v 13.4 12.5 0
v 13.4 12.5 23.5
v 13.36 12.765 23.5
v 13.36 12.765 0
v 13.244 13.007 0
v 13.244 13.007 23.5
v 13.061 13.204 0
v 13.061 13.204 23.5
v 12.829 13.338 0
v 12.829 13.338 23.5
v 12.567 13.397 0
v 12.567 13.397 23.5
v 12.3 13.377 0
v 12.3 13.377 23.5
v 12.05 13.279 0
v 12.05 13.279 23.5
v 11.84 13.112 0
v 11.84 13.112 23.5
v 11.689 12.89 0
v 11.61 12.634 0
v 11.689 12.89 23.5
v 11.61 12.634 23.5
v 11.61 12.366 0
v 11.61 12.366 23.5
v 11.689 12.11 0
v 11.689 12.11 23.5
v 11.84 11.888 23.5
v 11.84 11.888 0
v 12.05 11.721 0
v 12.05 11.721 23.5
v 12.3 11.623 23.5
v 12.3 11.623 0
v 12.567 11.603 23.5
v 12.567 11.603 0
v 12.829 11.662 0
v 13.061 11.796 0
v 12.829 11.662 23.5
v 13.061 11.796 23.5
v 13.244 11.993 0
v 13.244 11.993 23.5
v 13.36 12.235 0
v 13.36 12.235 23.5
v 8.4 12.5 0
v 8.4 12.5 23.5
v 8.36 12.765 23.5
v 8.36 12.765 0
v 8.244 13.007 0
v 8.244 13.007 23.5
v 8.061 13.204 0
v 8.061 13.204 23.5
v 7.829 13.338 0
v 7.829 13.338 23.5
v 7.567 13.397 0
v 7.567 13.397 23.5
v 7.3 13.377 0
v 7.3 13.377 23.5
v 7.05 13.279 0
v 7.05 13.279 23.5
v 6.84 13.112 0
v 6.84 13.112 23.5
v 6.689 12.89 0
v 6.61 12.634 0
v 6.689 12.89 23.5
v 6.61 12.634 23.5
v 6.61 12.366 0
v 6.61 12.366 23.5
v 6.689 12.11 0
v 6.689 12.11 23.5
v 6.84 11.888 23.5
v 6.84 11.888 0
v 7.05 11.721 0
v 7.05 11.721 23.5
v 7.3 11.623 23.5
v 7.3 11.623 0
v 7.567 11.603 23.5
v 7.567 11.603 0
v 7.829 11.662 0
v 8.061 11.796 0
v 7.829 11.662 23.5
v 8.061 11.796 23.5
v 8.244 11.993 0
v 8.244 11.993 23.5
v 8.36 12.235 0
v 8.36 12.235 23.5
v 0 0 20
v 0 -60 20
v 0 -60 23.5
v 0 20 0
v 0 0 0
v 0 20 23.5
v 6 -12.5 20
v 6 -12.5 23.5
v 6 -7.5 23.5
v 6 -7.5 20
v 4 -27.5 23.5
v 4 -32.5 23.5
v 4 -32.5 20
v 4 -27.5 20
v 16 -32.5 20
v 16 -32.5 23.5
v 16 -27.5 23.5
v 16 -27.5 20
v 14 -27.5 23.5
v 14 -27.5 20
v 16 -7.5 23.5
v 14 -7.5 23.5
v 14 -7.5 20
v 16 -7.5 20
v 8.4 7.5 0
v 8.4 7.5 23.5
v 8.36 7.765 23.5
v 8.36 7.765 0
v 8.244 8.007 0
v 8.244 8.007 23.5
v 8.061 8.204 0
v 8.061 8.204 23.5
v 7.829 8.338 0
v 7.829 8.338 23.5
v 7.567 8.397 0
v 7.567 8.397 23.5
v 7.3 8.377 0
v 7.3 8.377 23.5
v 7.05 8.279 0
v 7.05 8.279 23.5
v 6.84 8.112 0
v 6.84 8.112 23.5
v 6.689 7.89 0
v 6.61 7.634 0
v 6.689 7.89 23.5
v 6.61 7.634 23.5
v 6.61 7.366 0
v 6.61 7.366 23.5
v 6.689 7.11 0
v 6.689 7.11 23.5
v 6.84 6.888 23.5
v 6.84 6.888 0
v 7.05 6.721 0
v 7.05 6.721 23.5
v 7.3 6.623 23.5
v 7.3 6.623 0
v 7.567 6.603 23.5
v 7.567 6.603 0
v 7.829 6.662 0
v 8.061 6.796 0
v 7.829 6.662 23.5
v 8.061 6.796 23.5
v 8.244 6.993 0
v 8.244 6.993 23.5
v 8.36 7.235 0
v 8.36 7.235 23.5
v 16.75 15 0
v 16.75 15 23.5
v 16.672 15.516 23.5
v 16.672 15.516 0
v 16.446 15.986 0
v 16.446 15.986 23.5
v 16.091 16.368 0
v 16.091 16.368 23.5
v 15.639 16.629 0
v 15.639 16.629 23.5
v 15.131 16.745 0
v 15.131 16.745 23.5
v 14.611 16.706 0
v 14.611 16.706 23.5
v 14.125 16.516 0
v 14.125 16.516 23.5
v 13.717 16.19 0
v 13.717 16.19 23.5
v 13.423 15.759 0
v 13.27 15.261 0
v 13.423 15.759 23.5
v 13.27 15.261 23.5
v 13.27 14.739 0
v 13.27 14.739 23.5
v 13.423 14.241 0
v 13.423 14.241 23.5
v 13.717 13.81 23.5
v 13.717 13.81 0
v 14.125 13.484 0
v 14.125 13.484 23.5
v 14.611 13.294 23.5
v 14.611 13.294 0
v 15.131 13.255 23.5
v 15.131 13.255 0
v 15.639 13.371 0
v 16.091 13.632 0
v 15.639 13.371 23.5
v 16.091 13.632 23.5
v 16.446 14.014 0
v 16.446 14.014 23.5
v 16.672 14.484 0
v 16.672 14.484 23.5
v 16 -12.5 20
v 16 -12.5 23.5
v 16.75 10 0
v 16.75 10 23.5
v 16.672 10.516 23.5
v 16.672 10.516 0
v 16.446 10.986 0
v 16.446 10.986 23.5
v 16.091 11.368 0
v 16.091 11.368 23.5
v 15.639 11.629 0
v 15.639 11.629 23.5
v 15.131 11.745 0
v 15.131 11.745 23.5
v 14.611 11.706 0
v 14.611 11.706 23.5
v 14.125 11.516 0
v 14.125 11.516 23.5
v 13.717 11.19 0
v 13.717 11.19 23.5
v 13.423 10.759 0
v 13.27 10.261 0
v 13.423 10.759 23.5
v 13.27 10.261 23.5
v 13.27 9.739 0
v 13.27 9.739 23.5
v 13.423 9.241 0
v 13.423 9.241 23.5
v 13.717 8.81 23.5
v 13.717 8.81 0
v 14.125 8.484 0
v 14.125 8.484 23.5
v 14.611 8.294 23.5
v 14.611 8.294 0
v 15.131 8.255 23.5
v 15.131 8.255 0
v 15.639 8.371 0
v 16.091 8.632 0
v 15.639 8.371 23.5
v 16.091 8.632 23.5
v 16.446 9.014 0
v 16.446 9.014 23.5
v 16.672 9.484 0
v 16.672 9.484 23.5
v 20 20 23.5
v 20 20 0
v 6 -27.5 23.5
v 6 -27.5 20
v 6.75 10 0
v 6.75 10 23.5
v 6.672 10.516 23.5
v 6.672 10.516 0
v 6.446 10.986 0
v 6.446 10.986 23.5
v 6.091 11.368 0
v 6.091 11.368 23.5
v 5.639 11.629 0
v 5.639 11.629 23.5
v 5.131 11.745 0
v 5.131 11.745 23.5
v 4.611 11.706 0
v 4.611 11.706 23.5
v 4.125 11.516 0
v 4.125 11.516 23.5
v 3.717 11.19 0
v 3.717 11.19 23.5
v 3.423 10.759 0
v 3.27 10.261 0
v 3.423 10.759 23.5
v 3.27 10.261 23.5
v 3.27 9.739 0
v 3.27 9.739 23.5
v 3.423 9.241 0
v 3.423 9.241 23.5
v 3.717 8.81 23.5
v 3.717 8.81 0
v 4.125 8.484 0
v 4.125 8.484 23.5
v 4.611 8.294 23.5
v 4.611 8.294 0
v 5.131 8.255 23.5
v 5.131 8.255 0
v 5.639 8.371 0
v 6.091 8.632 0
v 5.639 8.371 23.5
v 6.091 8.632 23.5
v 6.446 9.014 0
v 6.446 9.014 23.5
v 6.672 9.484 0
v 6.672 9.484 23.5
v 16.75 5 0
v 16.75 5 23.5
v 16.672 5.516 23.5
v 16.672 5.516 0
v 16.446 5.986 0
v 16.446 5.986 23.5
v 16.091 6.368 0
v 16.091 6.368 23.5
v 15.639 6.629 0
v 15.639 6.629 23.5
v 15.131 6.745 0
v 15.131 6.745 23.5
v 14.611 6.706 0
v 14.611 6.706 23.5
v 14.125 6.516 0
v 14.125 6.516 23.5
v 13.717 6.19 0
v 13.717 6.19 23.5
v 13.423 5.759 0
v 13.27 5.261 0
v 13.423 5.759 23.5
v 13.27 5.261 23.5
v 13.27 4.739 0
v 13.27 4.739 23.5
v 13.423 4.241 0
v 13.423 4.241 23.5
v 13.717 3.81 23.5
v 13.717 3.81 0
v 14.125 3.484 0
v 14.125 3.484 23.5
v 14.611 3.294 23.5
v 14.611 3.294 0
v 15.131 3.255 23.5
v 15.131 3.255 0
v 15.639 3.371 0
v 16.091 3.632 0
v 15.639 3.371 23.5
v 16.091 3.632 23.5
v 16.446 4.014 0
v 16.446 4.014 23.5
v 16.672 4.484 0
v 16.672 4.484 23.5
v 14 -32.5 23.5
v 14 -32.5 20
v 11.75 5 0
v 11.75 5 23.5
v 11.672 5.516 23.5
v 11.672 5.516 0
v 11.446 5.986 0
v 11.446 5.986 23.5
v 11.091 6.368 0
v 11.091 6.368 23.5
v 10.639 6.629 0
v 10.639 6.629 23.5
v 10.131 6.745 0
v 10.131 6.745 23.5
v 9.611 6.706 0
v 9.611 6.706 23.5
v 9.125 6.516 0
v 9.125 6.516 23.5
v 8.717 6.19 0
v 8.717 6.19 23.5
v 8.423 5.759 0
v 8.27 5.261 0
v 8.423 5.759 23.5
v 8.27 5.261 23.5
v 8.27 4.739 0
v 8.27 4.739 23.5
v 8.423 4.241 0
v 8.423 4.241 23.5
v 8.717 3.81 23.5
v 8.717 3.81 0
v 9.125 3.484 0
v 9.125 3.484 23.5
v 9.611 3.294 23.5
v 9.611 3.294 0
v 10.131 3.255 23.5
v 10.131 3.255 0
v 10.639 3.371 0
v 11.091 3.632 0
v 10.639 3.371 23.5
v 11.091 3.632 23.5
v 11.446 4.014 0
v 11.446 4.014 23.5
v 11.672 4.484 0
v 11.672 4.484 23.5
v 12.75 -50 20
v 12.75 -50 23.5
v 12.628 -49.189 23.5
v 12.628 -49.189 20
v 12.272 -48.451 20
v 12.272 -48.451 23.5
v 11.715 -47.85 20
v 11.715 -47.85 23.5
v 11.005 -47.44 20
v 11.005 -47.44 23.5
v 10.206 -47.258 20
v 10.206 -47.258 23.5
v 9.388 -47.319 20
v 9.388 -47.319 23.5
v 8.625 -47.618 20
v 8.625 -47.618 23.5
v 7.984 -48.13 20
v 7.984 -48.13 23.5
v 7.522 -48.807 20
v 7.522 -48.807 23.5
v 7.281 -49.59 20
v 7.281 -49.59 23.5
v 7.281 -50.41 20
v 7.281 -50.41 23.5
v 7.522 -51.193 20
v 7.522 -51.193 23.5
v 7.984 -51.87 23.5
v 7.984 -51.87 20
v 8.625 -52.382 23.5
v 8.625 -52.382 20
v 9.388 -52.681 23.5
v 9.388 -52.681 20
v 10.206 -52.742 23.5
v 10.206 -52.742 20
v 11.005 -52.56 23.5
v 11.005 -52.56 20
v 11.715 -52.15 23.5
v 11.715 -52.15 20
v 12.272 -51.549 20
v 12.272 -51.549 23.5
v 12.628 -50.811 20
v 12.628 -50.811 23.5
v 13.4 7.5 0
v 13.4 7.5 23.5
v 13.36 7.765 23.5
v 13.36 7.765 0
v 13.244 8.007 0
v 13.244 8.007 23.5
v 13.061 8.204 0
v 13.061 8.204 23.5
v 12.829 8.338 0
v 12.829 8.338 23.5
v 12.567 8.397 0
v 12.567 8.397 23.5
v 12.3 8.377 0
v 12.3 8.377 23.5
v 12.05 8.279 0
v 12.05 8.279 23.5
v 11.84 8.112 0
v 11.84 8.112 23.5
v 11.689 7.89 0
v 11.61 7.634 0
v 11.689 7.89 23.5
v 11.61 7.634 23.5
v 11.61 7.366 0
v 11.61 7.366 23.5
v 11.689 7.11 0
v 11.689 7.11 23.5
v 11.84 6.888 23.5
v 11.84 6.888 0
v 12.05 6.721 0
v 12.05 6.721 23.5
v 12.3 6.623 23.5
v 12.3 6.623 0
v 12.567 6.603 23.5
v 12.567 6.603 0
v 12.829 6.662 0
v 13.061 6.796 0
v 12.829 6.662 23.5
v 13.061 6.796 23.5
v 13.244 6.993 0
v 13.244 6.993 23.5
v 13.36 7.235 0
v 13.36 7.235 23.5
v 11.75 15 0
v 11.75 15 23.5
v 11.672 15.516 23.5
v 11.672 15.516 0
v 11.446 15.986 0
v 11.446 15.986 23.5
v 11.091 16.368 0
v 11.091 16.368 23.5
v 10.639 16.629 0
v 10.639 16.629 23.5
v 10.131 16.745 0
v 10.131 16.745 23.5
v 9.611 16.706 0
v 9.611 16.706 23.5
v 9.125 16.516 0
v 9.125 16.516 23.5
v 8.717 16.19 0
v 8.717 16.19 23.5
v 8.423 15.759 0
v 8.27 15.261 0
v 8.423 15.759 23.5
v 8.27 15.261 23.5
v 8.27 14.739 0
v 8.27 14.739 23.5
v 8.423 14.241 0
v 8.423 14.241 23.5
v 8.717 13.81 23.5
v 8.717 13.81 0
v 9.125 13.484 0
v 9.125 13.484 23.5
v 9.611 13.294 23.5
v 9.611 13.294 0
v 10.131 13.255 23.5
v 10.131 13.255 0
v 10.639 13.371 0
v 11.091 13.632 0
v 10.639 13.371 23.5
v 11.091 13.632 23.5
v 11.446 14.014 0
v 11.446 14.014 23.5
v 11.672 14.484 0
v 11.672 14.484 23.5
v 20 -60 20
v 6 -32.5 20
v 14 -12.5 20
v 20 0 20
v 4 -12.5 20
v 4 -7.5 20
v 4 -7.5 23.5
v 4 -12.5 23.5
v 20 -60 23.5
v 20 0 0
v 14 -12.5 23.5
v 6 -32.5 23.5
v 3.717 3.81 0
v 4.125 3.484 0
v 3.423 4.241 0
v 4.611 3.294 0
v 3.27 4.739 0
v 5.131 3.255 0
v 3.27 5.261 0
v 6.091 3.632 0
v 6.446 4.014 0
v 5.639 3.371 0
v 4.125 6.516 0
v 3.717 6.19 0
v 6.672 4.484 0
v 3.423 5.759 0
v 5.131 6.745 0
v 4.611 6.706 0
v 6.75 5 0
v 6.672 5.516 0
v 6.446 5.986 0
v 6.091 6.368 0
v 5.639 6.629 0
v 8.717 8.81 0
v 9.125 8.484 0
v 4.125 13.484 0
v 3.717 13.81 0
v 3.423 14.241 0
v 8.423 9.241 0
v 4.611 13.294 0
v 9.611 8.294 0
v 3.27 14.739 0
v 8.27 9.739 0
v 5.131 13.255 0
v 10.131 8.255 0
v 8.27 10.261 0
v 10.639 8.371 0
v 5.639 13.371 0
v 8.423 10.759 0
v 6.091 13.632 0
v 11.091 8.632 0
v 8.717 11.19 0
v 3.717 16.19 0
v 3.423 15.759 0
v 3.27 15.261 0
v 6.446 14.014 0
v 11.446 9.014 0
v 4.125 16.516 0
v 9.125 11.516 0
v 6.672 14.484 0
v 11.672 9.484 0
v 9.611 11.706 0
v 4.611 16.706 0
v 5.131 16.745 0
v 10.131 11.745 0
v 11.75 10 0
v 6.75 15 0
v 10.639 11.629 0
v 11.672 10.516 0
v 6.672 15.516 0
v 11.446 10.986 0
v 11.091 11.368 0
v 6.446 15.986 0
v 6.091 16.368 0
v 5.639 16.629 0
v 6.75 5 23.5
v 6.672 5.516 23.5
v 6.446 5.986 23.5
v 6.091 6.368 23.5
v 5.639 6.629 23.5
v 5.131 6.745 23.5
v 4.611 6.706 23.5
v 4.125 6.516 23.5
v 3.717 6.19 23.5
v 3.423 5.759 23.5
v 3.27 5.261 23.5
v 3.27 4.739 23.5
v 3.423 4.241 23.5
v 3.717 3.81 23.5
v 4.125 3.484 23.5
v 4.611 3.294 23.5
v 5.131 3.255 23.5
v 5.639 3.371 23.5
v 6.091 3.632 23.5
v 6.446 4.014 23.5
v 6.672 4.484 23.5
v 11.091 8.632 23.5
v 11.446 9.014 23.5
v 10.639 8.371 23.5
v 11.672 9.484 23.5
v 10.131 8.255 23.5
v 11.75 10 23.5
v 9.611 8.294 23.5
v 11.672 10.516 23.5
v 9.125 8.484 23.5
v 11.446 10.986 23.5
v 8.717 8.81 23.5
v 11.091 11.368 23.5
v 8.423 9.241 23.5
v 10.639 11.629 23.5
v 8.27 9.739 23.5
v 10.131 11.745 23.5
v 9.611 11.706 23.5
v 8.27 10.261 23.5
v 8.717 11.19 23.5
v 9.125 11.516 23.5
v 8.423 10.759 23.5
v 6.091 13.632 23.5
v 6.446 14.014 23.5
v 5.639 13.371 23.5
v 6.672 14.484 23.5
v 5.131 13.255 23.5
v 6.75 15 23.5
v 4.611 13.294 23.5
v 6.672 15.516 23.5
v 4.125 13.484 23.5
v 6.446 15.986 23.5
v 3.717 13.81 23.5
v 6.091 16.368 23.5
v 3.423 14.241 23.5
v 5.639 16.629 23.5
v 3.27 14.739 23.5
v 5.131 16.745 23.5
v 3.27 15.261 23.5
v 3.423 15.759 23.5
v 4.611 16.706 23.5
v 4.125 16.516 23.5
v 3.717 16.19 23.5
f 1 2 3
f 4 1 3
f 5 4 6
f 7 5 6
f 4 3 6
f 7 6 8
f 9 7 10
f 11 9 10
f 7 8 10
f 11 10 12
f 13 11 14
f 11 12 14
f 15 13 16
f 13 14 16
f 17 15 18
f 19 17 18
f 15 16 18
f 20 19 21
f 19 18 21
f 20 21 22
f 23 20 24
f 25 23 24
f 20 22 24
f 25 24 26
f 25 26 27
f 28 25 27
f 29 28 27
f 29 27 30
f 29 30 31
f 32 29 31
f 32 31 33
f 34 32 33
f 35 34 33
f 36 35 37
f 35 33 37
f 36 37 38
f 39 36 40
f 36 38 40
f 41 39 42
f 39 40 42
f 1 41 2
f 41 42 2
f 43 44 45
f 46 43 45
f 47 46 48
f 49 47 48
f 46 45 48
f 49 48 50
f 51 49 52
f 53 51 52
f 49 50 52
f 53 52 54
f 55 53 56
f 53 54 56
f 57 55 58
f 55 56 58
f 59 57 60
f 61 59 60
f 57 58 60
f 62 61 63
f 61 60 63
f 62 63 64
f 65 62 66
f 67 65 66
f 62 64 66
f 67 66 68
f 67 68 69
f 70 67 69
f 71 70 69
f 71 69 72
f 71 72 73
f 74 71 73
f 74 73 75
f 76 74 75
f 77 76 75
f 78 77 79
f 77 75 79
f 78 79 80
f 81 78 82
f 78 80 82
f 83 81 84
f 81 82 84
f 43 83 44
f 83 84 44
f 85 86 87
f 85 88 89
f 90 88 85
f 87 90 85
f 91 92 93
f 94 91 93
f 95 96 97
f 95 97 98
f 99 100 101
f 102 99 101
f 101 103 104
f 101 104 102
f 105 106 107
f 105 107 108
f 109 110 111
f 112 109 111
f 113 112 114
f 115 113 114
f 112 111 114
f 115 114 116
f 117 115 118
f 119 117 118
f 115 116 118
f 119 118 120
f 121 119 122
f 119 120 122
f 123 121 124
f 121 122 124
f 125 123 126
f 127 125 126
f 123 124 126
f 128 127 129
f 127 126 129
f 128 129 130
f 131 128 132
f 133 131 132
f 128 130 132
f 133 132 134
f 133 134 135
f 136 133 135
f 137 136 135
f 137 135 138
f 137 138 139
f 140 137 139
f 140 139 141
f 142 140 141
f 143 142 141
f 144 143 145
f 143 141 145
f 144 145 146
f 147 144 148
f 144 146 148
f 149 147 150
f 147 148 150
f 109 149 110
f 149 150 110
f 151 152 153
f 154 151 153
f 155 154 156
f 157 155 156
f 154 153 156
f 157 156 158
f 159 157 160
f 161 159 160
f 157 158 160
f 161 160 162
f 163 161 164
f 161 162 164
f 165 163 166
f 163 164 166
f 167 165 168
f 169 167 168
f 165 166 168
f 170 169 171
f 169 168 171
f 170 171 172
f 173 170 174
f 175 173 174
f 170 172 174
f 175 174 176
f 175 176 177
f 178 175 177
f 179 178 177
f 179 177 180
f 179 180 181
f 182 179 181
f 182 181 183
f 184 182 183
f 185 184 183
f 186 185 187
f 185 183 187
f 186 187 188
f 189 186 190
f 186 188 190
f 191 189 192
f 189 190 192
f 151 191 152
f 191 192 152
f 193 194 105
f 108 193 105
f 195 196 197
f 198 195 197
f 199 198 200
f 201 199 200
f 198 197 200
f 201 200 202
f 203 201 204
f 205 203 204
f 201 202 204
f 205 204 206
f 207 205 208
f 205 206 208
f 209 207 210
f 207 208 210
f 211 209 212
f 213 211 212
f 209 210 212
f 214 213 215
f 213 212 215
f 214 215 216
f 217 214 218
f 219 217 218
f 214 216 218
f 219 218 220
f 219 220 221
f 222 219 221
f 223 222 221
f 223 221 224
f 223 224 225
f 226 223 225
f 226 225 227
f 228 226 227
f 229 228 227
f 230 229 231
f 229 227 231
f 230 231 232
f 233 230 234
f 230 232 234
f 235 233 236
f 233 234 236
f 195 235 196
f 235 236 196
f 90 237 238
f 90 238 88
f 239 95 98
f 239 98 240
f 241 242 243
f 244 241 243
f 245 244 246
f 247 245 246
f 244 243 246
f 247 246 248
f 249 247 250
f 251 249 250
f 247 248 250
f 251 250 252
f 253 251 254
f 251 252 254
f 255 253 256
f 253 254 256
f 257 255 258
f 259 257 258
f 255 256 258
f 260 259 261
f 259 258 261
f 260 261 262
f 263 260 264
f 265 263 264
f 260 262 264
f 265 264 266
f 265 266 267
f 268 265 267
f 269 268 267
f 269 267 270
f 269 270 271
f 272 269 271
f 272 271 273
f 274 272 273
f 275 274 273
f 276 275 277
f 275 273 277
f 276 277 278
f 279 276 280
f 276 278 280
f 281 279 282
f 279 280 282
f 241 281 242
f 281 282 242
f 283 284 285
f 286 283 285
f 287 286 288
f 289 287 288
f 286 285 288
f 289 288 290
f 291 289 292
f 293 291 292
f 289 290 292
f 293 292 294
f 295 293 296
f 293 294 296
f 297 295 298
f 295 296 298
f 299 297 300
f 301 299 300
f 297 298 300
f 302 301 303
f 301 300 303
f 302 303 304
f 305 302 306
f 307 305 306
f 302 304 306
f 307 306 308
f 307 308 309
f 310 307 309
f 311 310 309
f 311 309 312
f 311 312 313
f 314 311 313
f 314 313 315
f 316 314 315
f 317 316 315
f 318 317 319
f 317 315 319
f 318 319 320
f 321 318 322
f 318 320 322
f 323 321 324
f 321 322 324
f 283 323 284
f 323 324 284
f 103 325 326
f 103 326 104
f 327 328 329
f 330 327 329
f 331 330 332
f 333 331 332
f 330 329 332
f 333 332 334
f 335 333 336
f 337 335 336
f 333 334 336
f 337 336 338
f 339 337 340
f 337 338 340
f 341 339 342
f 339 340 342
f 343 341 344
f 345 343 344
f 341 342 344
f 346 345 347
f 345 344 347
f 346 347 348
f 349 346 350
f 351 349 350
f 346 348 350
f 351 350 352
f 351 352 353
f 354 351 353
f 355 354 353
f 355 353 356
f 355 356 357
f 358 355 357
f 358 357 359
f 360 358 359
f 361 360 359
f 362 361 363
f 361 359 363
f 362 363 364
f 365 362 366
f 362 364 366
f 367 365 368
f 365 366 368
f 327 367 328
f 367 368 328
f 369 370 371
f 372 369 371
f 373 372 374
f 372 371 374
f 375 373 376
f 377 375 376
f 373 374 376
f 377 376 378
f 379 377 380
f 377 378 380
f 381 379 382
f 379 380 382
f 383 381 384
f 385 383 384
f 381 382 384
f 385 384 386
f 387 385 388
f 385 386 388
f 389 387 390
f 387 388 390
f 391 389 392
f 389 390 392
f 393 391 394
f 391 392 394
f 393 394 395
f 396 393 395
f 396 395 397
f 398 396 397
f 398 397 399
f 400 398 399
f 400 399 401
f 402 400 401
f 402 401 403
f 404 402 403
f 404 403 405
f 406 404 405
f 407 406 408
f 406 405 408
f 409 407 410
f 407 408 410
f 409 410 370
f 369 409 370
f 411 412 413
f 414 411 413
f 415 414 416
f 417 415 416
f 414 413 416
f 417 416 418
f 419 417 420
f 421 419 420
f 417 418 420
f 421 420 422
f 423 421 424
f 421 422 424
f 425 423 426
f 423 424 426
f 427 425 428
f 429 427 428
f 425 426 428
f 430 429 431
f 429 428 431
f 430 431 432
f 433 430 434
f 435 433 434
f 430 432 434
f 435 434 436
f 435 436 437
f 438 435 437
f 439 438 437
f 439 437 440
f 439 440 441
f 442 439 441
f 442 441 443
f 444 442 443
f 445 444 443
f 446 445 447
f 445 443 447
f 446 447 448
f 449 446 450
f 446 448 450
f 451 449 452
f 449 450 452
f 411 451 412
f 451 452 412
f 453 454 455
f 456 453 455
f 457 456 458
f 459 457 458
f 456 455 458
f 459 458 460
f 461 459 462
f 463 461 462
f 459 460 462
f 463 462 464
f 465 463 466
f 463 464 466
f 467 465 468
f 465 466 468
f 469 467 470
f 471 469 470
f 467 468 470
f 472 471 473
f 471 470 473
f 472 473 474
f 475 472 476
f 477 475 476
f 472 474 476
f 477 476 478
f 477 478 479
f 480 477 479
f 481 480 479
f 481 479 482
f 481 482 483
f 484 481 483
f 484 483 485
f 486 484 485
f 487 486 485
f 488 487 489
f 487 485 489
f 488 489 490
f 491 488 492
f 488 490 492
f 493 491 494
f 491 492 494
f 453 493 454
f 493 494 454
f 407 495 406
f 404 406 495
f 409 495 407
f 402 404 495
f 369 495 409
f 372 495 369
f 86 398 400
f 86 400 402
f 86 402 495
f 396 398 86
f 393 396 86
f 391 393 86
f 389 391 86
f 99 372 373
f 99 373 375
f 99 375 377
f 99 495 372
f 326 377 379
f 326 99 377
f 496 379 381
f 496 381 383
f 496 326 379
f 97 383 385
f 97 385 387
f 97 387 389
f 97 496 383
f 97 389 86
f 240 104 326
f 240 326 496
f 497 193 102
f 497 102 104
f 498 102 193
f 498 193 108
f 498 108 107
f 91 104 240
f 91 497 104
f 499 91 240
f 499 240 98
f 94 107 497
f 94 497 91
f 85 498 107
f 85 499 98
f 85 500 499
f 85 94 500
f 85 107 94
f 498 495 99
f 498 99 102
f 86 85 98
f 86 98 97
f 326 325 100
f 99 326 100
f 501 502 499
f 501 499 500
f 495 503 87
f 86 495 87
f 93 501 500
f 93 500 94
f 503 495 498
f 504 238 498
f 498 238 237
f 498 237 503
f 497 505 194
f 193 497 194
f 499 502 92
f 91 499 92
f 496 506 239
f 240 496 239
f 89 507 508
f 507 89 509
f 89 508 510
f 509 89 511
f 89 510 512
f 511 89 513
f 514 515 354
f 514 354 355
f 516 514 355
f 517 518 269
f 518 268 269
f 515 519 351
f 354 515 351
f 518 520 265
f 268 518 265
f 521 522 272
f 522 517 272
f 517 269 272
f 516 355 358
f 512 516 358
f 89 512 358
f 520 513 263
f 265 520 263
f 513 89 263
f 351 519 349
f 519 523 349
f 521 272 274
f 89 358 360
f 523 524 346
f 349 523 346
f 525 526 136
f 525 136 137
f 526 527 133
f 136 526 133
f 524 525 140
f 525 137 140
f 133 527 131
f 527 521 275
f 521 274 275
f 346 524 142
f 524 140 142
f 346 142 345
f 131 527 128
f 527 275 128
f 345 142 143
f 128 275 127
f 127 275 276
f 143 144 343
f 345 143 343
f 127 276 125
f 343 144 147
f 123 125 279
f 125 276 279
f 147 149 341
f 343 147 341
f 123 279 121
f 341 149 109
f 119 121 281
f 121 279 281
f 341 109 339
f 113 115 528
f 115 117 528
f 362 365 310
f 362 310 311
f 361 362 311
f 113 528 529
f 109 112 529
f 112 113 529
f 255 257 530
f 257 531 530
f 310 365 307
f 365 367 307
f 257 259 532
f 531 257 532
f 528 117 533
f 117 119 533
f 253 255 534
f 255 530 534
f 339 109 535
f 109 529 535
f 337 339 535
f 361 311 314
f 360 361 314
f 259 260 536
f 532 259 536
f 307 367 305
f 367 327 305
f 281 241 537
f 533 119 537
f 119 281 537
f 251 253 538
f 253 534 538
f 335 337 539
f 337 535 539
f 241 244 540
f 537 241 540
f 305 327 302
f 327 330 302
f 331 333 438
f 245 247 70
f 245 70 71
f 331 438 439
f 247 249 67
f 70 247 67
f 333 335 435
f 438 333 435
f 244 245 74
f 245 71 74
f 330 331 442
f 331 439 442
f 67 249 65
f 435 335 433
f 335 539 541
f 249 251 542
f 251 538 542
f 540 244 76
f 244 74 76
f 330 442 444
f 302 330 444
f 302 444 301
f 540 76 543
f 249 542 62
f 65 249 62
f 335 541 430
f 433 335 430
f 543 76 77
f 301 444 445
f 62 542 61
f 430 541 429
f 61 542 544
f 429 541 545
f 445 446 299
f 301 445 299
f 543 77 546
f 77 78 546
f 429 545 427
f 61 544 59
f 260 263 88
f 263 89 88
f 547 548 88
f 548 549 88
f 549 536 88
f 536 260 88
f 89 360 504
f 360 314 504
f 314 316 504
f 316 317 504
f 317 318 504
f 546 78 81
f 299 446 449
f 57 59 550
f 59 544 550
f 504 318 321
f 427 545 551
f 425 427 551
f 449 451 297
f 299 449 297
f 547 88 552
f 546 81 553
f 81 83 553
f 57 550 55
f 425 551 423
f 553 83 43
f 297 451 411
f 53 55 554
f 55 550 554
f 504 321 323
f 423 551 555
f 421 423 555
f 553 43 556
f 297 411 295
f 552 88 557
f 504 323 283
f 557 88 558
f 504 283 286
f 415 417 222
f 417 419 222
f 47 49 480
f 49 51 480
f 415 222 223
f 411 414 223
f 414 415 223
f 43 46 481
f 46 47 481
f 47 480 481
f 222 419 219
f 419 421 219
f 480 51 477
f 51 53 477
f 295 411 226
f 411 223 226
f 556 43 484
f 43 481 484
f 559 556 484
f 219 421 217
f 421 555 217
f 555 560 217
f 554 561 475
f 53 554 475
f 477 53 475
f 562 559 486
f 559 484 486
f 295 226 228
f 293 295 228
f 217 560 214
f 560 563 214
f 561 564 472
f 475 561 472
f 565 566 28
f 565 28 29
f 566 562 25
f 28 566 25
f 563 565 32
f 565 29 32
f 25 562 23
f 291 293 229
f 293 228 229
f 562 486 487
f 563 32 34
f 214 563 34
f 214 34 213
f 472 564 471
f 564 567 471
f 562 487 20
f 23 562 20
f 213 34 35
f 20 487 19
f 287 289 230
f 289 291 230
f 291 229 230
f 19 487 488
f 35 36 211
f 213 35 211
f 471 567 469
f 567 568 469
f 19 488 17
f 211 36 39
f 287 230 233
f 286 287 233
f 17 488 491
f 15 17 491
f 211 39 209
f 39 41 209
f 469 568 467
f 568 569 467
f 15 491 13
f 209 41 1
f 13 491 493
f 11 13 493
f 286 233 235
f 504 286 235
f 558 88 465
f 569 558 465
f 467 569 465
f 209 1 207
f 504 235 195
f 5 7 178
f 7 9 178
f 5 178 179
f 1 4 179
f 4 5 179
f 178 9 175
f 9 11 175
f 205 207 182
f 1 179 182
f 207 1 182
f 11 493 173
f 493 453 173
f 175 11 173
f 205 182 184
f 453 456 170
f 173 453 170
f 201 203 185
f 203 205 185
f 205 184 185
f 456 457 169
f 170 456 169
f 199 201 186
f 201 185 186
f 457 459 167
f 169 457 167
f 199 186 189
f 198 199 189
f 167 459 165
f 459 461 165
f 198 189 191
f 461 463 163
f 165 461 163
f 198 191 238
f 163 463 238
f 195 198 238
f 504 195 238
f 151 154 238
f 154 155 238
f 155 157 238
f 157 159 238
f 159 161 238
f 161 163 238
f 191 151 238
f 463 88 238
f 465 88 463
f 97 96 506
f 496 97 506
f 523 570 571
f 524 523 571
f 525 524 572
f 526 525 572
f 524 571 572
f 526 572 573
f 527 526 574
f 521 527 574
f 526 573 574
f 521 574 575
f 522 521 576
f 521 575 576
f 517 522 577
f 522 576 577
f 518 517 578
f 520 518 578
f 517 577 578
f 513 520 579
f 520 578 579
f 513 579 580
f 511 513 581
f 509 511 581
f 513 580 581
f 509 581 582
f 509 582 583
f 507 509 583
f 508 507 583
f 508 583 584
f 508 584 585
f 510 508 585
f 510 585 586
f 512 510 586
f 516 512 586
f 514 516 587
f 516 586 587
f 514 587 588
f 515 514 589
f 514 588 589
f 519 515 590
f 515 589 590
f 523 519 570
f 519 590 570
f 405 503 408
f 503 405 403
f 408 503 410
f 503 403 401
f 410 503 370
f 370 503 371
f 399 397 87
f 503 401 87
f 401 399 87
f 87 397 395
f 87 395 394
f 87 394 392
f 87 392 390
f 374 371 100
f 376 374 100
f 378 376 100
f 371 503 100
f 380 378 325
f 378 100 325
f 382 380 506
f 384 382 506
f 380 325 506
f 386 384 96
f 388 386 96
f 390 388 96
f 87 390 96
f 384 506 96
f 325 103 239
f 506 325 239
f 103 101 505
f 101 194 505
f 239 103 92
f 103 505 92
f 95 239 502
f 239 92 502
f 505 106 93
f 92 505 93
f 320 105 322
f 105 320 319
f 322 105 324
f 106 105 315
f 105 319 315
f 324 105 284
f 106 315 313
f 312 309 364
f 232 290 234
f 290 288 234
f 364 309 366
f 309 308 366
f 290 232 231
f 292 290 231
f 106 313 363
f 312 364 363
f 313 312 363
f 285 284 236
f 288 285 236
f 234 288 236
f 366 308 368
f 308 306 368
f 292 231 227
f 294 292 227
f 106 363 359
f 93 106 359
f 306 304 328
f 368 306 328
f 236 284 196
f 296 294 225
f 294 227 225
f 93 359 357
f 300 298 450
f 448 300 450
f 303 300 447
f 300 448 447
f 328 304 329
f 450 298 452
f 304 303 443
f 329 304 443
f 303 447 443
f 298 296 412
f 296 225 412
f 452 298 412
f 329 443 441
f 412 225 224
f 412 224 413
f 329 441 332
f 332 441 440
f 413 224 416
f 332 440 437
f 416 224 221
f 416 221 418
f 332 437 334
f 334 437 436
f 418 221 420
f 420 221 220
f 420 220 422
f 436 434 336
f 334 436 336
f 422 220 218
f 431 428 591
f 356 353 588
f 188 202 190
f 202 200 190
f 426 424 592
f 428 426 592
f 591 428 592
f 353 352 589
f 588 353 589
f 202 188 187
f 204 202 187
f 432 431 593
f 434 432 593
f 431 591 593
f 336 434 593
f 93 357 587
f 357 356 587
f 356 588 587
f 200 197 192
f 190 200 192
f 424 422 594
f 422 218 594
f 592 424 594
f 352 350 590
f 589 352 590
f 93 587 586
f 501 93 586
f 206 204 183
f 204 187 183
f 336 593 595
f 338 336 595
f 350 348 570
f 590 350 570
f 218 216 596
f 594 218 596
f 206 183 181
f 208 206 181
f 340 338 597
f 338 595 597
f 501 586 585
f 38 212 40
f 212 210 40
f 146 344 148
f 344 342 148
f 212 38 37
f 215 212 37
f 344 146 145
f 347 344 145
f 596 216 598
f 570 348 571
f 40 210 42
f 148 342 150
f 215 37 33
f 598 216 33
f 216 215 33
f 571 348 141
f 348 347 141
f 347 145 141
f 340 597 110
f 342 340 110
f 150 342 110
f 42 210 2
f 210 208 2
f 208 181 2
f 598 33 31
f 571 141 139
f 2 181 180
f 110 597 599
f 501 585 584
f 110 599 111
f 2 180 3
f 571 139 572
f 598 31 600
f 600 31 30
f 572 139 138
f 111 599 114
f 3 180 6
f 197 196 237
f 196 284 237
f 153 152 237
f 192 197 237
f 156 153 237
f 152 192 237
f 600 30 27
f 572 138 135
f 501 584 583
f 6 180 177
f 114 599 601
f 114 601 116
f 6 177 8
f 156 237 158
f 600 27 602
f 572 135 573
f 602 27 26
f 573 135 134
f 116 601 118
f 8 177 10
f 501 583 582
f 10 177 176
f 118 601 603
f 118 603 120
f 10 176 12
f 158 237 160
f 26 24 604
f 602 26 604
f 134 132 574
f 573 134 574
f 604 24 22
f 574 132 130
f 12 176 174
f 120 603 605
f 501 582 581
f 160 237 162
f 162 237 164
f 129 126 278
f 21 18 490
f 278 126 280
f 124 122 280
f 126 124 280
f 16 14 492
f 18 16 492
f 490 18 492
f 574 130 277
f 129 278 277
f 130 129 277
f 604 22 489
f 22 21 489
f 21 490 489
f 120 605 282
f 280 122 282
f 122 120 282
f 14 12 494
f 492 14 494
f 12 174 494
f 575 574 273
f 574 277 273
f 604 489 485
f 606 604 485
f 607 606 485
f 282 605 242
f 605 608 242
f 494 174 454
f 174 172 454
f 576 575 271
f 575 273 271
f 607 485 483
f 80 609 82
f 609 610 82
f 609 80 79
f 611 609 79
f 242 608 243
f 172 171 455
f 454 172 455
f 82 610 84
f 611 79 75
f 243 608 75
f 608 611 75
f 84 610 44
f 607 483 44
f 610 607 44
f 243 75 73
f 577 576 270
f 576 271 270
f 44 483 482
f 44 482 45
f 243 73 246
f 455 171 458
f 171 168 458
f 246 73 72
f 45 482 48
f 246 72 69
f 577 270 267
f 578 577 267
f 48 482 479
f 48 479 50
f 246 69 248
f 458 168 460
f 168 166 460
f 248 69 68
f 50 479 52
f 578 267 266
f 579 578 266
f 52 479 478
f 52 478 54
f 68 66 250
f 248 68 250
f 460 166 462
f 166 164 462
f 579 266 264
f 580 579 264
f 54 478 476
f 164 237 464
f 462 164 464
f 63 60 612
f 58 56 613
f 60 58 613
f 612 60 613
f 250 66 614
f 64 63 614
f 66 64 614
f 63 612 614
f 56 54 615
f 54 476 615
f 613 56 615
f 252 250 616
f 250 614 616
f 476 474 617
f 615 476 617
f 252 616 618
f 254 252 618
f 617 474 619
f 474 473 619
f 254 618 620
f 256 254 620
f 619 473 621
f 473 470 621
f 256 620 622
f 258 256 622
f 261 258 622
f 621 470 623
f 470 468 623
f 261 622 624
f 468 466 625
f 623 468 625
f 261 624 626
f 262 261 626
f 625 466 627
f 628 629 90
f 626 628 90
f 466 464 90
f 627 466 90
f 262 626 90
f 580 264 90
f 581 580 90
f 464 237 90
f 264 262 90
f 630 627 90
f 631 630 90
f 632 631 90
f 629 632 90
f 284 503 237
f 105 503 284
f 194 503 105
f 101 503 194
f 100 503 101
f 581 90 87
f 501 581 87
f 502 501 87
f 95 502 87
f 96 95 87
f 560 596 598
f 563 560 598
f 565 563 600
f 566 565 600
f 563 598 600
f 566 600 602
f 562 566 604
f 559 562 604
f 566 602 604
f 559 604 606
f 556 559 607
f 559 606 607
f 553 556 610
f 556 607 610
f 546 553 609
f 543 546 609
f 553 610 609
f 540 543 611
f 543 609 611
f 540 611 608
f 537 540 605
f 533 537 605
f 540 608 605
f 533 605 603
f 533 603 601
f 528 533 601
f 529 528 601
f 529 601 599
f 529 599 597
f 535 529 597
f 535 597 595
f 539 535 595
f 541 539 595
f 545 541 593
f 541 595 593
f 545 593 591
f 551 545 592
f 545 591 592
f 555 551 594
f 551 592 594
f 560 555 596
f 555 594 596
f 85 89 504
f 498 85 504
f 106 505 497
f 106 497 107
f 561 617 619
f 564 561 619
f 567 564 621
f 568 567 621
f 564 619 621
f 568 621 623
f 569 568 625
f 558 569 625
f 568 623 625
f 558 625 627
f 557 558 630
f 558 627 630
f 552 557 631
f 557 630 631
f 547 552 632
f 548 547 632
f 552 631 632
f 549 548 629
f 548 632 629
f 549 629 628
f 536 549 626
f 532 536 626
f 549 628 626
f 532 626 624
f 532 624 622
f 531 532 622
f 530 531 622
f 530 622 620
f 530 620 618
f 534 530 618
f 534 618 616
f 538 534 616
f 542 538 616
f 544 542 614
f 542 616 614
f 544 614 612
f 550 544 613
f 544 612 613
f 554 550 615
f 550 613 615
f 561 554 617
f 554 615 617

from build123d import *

# Parameters (mm, degrees)
F0_W     = 20
F0_H     = 20
F1_DEPTH = 20
F2_W     = 20
F2_H     = 3.5
F3_DEPTH = 80
F4_R     = 2.75
F4_W     = 2
F4_H     = 5
F5_DEPTH = 3.5
F6_R     = 1.75
F6_R_2   = 0.9
F7_DEPTH = 23.5


with BuildPart() as f1:
    # F0 (on Top) → F1 (new body)
    with BuildSketch(Plane.XY):
        with Locations((10, 10)):
            Rectangle(F0_W, F0_H)
    extrude(amount=F1_DEPTH)

    # F2 (on face) → F3 (join)
    with BuildSketch(Plane(origin=(0, 20, 0), x_dir=(-1, 0, 0), z_dir=(0, 1, 0))):
        with Locations((-10, 21.75)):
            Rectangle(F2_W, F2_H)
    extrude(amount=-F3_DEPTH)

    # F4 (on face) → F5 (cut, through all)
    with BuildSketch(Plane.XY.offset(23.5)):
        with Locations((10, -50)):
            Circle(F4_R)
        with Locations((5, -10)):
            Rectangle(F4_W, F4_H)
        with Locations((5, -30)):
            Rectangle(F4_W, F4_H)
        with Locations((15, -10)):
            Rectangle(F4_W, F4_H)
        with Locations((15, -30)):
            Rectangle(F4_W, F4_H)
    extrude(amount=-F5_DEPTH, mode=Mode.SUBTRACT)

    # F6 (on face) → F7 (cut, through all)
    with BuildSketch(Plane.XY.offset(23.5)):
        with Locations((5, 15)):
            Circle(F6_R)
        with Locations((10, 15)):
            Circle(F6_R)
        with Locations((15, 15)):
            Circle(F6_R)
        with Locations((5, 10)):
            Circle(F6_R)
        with Locations((10, 10)):
            Circle(F6_R)
        with Locations((15, 10)):
            Circle(F6_R)
        with Locations((5, 5)):
            Circle(F6_R)
        with Locations((10, 5)):
            Circle(F6_R)
        with Locations((15, 5)):
            Circle(F6_R)
        with Locations((7.5, 12.5)):
            Circle(F6_R_2)
        with Locations((7.5, 7.5)):
            Circle(F6_R_2)
        with Locations((12.5, 12.5)):
            Circle(F6_R_2)
        with Locations((12.5, 7.5)):
            Circle(F6_R_2)
    extrude(amount=-F7_DEPTH, mode=Mode.SUBTRACT)


solid = f1.part
